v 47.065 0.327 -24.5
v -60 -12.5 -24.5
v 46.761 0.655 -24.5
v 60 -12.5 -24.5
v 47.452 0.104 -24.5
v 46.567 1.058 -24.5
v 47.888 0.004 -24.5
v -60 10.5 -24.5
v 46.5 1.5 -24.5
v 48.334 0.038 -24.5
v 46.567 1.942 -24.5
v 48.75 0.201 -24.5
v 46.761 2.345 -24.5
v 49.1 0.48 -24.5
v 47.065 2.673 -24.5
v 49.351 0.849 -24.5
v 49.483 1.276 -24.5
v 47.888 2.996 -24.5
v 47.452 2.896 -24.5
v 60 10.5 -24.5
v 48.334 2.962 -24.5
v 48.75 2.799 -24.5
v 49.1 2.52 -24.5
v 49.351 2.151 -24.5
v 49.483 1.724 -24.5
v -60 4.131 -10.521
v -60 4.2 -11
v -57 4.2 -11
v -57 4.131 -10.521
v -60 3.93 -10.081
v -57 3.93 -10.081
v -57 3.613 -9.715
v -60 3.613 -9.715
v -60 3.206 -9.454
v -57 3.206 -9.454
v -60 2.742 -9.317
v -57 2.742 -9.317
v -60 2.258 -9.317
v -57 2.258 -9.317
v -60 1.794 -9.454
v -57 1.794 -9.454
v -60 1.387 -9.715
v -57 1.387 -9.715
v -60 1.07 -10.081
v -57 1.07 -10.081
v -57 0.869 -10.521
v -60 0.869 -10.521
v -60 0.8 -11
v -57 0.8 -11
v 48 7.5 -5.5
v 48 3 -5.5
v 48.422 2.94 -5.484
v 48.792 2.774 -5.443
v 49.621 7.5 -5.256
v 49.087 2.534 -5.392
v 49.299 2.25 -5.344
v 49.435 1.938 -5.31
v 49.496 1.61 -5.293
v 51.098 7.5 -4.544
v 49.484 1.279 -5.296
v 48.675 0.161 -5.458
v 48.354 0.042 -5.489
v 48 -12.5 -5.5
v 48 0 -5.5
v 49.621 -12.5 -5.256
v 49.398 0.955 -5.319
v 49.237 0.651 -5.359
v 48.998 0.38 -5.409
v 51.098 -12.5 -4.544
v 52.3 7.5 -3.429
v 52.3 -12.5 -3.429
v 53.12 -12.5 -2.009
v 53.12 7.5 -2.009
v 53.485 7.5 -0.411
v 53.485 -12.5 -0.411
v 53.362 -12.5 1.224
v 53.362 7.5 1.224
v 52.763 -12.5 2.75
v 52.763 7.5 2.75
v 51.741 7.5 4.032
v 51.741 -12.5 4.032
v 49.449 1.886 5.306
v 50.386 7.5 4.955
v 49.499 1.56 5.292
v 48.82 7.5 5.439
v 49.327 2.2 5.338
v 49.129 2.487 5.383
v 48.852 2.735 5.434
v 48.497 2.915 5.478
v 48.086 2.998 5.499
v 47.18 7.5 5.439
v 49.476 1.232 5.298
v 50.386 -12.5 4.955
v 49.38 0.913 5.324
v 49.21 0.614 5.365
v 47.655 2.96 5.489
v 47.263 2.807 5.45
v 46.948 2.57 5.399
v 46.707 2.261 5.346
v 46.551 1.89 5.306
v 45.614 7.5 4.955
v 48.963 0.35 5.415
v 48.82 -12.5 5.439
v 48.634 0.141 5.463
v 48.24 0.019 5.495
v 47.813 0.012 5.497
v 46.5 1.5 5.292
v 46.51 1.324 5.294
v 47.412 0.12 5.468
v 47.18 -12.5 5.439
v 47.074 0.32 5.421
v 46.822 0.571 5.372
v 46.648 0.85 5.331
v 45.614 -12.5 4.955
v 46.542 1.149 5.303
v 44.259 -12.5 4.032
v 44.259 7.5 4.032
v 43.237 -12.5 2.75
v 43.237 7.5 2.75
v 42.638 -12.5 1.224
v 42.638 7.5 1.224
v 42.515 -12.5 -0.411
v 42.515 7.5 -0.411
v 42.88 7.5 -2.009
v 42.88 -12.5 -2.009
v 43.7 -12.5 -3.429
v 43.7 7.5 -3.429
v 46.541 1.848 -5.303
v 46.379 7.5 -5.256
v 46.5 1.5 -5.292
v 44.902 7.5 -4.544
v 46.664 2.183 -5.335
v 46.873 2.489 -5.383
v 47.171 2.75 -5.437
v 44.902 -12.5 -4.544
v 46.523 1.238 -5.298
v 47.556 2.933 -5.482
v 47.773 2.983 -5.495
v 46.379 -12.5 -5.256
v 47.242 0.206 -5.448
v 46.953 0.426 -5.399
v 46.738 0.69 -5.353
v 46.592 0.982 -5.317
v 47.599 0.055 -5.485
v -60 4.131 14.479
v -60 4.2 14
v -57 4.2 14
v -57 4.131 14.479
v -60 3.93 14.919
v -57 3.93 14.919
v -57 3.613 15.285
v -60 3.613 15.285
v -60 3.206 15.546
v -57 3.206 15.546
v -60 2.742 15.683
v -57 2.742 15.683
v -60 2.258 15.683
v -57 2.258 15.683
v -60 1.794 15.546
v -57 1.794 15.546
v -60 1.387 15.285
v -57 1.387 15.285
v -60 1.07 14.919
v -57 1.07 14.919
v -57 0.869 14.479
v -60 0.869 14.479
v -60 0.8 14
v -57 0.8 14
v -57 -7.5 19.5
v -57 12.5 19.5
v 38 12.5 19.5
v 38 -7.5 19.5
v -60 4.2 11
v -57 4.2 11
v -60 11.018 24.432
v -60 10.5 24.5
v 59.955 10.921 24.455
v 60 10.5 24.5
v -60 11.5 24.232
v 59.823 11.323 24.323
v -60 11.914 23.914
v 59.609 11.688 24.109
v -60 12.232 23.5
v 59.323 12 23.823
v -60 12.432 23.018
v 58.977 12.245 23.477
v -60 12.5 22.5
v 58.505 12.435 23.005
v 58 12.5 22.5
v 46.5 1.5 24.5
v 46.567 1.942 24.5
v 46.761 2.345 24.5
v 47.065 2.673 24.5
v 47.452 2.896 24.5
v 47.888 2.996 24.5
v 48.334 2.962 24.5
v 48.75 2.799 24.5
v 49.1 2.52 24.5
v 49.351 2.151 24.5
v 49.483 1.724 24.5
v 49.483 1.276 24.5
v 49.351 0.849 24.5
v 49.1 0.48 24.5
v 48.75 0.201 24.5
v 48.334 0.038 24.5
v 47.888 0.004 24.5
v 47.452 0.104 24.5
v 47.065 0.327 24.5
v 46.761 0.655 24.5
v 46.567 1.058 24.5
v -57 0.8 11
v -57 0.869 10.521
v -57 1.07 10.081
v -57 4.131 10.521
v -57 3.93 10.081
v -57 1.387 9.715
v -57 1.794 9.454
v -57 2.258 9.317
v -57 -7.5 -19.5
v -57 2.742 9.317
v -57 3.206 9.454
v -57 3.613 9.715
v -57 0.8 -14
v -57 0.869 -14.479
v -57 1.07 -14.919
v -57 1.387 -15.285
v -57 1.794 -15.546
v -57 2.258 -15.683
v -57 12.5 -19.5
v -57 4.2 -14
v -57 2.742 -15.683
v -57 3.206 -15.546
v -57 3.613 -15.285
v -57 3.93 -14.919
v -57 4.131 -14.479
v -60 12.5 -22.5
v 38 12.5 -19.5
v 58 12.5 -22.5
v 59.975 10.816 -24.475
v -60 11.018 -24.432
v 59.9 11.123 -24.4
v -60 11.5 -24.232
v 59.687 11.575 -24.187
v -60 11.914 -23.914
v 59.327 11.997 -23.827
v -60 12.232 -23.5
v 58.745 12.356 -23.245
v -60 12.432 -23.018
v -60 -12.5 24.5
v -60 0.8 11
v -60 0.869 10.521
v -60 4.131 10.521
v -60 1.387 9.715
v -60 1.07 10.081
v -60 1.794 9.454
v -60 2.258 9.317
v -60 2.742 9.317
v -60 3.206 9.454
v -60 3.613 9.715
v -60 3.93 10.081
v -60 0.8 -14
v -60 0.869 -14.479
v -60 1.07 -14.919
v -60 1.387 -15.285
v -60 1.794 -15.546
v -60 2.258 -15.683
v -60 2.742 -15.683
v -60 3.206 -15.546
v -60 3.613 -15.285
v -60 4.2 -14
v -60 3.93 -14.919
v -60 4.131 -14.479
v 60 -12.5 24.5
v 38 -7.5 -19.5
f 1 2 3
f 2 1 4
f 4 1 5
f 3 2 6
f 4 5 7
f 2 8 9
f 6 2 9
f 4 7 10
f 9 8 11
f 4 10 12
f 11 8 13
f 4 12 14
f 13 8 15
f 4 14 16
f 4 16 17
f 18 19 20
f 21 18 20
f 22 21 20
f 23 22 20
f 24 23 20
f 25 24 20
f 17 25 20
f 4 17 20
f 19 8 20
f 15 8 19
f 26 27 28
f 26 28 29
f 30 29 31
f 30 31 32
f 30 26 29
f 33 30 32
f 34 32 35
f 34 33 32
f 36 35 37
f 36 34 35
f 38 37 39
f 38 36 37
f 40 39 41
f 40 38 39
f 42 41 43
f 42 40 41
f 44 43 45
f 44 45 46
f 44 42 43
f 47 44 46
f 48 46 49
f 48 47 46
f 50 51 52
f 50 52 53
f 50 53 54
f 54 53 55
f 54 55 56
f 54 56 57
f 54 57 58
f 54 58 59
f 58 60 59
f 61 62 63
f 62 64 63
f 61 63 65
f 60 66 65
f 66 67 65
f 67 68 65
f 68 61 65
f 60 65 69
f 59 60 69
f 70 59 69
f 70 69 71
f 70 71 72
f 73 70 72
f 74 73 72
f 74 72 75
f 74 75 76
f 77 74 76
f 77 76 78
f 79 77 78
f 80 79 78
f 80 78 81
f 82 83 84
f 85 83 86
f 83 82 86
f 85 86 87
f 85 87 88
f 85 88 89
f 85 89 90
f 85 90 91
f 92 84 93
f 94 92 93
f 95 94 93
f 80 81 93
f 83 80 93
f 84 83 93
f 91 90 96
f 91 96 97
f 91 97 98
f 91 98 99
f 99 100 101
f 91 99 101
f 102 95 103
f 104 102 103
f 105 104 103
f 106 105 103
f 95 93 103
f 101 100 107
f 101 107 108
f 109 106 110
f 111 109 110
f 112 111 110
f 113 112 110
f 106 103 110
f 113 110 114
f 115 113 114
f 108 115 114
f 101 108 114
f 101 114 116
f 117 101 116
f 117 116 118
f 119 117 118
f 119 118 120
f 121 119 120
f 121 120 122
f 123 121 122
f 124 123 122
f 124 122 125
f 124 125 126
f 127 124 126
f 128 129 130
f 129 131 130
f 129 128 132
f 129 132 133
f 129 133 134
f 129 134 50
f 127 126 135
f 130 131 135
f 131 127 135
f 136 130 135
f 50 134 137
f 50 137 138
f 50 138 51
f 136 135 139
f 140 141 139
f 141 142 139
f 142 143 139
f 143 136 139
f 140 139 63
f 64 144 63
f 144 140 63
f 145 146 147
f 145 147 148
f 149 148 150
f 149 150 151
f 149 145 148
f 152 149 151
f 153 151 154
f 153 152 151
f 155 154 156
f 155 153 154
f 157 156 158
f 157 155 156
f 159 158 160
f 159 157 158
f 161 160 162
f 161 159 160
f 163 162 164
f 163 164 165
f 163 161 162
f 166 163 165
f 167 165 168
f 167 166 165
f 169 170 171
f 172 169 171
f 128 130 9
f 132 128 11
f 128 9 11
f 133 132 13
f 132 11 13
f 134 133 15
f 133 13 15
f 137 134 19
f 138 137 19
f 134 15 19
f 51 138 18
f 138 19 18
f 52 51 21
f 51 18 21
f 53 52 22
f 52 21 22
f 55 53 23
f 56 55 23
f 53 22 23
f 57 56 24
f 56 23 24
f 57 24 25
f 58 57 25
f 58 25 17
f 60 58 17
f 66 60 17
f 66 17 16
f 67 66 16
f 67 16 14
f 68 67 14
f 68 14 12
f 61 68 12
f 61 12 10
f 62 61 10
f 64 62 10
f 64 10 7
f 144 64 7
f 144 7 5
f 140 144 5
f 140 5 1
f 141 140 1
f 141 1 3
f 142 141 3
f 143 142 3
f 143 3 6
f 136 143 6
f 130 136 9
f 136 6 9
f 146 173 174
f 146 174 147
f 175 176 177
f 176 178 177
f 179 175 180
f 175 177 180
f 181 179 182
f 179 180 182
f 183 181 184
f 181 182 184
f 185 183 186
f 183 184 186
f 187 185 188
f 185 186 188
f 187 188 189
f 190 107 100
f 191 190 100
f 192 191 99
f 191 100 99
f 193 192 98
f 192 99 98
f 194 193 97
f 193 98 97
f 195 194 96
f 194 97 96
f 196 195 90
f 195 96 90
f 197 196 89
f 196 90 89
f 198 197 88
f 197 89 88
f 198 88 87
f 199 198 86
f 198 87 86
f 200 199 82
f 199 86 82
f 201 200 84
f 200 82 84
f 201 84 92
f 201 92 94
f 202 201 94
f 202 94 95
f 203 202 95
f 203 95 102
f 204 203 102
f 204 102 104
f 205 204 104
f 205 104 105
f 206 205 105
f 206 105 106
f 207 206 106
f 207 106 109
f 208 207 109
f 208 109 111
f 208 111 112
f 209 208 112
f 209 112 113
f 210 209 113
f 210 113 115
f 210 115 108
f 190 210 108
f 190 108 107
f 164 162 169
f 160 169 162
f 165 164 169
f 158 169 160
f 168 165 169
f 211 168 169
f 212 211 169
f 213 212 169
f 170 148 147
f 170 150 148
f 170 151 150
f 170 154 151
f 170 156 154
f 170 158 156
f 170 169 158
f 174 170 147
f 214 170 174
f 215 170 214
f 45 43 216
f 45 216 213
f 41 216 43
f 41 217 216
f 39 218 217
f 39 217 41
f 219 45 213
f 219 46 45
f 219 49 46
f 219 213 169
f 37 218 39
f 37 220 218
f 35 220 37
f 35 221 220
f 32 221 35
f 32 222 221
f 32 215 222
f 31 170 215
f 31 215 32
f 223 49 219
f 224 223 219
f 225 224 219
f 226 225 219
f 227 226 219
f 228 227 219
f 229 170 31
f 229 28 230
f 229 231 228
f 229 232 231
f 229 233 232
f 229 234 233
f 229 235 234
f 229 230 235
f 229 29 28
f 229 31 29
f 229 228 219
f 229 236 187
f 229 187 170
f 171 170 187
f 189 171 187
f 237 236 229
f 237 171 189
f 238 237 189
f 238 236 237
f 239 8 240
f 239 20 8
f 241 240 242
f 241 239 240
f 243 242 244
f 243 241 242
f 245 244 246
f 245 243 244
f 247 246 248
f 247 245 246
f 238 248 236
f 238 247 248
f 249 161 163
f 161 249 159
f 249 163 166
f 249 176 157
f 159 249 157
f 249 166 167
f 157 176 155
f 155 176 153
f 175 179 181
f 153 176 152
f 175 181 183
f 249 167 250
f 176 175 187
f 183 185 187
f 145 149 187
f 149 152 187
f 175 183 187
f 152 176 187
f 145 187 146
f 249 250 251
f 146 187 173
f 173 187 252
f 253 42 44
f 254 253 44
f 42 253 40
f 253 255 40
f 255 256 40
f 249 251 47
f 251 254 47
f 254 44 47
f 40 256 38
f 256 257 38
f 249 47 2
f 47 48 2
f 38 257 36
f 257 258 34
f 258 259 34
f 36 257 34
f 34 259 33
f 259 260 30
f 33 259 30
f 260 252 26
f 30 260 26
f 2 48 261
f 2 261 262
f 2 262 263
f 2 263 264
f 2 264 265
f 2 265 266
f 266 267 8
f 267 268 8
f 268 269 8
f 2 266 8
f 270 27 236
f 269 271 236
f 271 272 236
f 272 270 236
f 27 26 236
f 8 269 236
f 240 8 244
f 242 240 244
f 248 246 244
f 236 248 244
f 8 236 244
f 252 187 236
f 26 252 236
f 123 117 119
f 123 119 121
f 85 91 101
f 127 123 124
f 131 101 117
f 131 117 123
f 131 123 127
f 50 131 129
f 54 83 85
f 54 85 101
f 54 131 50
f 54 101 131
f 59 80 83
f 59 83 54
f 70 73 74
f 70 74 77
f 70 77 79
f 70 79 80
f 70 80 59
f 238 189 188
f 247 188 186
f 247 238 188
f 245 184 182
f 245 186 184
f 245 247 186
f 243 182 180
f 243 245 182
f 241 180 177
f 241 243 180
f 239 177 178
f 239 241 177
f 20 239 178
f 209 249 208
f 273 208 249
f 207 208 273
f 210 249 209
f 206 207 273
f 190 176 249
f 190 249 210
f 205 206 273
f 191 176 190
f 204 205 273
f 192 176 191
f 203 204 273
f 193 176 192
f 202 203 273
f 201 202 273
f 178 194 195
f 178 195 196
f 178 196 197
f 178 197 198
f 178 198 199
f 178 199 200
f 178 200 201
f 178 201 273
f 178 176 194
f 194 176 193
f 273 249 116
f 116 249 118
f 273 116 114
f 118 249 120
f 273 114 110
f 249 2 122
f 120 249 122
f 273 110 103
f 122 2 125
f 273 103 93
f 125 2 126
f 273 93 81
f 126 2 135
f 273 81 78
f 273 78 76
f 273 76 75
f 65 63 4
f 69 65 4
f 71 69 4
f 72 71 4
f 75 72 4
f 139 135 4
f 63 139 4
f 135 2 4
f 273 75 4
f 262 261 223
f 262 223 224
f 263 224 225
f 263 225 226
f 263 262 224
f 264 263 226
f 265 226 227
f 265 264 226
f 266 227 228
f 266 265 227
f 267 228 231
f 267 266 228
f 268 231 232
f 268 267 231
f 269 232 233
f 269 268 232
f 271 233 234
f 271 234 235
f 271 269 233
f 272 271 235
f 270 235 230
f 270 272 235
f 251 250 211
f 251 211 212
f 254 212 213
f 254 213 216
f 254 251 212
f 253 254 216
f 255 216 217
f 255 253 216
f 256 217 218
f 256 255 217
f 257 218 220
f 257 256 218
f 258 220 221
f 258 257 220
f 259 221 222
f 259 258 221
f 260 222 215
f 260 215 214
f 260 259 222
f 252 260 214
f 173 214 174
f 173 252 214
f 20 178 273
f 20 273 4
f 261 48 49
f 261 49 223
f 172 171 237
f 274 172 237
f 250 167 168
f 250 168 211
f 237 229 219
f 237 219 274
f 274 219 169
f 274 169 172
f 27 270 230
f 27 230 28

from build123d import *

# Parameters (mm, degrees)
SKETCH1_W                = 120
SKETCH1_H                = 49
BOSS_EXTRUDE1_DEPTH      = 12.5
SKETCH2_W                = 95
SKETCH2_H                = 39
CUT_EXTRUDE1_DEPTH       = 20
FILLET1_R                = 2
M3_START                 = -60
M3_CLEARANCE_SLOT1_DEPTH = 3
SKETCH6_R                = 5.5
CUT_EXTRUDE2_DEPTH       = 20
SKETCH7_R                = 1.5
CUT_EXTRUDE3_DEPTH       = 79.468146403


# Read off the part's stored shape, not the designer's step: M3 Clearance Slot1
with BuildPart() as part:
    # Sketch1 → Boss-Extrude1 (new, symmetric)
    with BuildSketch(Plane(origin=(0, 0, 0), x_dir=(1, 0, 0), z_dir=(0, 1, 0))):
        Rectangle(SKETCH1_W, SKETCH1_H)
    extrude(amount=BOSS_EXTRUDE1_DEPTH, both=True)

    # Sketch2 → Cut-Extrude1 (cut)
    with BuildSketch(Plane(origin=(0, 12.5, 0), x_dir=(1, 0, 0), z_dir=(0, 1, 0))):
        with Locations((-9.5, 0)):
            Rectangle(SKETCH2_W, SKETCH2_H)
    extrude(amount=-CUT_EXTRUDE1_DEPTH, mode=Mode.SUBTRACT)

    # Fillet1
    fillet1_edges = [part.edges().sort_by_distance(p)[0] for p in [
        (0, 12.5, 24.5),
        (60, 12.5, 0),
        (0, 12.5, -24.5),
    ]]
    fillet(fillet1_edges, radius=FILLET1_R)

    # M3 Clearance Slot1 outline → M3 Clearance Slot1 (cut)
    with BuildSketch(Plane.YZ.offset(M3_START)):
        with BuildLine():
            Line((4.2, -14), (4.2, -11))
            ThreePointArc((4.2, -11), (2.5, -9.3), (0.8, -11))
            Line((0.8, -11), (0.8, -14))
            ThreePointArc((0.8, -14), (2.5, -15.7), (4.2, -14))
        make_face()
        with BuildLine():
            ThreePointArc((4.2, 14), (2.5, 15.7), (0.8, 14))
            Line((0.8, 14), (0.8, 11))
            ThreePointArc((0.8, 11), (2.5, 9.3), (4.2, 11))
            Line((4.2, 11), (4.2, 14))
        make_face()
    extrude(amount=M3_CLEARANCE_SLOT1_DEPTH, mode=Mode.SUBTRACT)

    # Sketch6 → Cut-Extrude2 (cut)
    with BuildSketch(Plane.XZ.offset(12.5)):
        with Locations(Location((48, 0, 0), (0, 0, 270))):
            Circle(SKETCH6_R)
    extrude(amount=-CUT_EXTRUDE2_DEPTH, mode=Mode.SUBTRACT)

    # Sketch7 → Cut-Extrude3 (cut, through all)
    with BuildSketch(Plane(origin=(0, 0, -24.5), x_dir=(-1, 0, 0), z_dir=(0, 0, -1))):
        with Locations((-48, 1.5)):
            Circle(SKETCH7_R)
    extrude(amount=-CUT_EXTRUDE3_DEPTH, mode=Mode.SUBTRACT)


solid = part.part
